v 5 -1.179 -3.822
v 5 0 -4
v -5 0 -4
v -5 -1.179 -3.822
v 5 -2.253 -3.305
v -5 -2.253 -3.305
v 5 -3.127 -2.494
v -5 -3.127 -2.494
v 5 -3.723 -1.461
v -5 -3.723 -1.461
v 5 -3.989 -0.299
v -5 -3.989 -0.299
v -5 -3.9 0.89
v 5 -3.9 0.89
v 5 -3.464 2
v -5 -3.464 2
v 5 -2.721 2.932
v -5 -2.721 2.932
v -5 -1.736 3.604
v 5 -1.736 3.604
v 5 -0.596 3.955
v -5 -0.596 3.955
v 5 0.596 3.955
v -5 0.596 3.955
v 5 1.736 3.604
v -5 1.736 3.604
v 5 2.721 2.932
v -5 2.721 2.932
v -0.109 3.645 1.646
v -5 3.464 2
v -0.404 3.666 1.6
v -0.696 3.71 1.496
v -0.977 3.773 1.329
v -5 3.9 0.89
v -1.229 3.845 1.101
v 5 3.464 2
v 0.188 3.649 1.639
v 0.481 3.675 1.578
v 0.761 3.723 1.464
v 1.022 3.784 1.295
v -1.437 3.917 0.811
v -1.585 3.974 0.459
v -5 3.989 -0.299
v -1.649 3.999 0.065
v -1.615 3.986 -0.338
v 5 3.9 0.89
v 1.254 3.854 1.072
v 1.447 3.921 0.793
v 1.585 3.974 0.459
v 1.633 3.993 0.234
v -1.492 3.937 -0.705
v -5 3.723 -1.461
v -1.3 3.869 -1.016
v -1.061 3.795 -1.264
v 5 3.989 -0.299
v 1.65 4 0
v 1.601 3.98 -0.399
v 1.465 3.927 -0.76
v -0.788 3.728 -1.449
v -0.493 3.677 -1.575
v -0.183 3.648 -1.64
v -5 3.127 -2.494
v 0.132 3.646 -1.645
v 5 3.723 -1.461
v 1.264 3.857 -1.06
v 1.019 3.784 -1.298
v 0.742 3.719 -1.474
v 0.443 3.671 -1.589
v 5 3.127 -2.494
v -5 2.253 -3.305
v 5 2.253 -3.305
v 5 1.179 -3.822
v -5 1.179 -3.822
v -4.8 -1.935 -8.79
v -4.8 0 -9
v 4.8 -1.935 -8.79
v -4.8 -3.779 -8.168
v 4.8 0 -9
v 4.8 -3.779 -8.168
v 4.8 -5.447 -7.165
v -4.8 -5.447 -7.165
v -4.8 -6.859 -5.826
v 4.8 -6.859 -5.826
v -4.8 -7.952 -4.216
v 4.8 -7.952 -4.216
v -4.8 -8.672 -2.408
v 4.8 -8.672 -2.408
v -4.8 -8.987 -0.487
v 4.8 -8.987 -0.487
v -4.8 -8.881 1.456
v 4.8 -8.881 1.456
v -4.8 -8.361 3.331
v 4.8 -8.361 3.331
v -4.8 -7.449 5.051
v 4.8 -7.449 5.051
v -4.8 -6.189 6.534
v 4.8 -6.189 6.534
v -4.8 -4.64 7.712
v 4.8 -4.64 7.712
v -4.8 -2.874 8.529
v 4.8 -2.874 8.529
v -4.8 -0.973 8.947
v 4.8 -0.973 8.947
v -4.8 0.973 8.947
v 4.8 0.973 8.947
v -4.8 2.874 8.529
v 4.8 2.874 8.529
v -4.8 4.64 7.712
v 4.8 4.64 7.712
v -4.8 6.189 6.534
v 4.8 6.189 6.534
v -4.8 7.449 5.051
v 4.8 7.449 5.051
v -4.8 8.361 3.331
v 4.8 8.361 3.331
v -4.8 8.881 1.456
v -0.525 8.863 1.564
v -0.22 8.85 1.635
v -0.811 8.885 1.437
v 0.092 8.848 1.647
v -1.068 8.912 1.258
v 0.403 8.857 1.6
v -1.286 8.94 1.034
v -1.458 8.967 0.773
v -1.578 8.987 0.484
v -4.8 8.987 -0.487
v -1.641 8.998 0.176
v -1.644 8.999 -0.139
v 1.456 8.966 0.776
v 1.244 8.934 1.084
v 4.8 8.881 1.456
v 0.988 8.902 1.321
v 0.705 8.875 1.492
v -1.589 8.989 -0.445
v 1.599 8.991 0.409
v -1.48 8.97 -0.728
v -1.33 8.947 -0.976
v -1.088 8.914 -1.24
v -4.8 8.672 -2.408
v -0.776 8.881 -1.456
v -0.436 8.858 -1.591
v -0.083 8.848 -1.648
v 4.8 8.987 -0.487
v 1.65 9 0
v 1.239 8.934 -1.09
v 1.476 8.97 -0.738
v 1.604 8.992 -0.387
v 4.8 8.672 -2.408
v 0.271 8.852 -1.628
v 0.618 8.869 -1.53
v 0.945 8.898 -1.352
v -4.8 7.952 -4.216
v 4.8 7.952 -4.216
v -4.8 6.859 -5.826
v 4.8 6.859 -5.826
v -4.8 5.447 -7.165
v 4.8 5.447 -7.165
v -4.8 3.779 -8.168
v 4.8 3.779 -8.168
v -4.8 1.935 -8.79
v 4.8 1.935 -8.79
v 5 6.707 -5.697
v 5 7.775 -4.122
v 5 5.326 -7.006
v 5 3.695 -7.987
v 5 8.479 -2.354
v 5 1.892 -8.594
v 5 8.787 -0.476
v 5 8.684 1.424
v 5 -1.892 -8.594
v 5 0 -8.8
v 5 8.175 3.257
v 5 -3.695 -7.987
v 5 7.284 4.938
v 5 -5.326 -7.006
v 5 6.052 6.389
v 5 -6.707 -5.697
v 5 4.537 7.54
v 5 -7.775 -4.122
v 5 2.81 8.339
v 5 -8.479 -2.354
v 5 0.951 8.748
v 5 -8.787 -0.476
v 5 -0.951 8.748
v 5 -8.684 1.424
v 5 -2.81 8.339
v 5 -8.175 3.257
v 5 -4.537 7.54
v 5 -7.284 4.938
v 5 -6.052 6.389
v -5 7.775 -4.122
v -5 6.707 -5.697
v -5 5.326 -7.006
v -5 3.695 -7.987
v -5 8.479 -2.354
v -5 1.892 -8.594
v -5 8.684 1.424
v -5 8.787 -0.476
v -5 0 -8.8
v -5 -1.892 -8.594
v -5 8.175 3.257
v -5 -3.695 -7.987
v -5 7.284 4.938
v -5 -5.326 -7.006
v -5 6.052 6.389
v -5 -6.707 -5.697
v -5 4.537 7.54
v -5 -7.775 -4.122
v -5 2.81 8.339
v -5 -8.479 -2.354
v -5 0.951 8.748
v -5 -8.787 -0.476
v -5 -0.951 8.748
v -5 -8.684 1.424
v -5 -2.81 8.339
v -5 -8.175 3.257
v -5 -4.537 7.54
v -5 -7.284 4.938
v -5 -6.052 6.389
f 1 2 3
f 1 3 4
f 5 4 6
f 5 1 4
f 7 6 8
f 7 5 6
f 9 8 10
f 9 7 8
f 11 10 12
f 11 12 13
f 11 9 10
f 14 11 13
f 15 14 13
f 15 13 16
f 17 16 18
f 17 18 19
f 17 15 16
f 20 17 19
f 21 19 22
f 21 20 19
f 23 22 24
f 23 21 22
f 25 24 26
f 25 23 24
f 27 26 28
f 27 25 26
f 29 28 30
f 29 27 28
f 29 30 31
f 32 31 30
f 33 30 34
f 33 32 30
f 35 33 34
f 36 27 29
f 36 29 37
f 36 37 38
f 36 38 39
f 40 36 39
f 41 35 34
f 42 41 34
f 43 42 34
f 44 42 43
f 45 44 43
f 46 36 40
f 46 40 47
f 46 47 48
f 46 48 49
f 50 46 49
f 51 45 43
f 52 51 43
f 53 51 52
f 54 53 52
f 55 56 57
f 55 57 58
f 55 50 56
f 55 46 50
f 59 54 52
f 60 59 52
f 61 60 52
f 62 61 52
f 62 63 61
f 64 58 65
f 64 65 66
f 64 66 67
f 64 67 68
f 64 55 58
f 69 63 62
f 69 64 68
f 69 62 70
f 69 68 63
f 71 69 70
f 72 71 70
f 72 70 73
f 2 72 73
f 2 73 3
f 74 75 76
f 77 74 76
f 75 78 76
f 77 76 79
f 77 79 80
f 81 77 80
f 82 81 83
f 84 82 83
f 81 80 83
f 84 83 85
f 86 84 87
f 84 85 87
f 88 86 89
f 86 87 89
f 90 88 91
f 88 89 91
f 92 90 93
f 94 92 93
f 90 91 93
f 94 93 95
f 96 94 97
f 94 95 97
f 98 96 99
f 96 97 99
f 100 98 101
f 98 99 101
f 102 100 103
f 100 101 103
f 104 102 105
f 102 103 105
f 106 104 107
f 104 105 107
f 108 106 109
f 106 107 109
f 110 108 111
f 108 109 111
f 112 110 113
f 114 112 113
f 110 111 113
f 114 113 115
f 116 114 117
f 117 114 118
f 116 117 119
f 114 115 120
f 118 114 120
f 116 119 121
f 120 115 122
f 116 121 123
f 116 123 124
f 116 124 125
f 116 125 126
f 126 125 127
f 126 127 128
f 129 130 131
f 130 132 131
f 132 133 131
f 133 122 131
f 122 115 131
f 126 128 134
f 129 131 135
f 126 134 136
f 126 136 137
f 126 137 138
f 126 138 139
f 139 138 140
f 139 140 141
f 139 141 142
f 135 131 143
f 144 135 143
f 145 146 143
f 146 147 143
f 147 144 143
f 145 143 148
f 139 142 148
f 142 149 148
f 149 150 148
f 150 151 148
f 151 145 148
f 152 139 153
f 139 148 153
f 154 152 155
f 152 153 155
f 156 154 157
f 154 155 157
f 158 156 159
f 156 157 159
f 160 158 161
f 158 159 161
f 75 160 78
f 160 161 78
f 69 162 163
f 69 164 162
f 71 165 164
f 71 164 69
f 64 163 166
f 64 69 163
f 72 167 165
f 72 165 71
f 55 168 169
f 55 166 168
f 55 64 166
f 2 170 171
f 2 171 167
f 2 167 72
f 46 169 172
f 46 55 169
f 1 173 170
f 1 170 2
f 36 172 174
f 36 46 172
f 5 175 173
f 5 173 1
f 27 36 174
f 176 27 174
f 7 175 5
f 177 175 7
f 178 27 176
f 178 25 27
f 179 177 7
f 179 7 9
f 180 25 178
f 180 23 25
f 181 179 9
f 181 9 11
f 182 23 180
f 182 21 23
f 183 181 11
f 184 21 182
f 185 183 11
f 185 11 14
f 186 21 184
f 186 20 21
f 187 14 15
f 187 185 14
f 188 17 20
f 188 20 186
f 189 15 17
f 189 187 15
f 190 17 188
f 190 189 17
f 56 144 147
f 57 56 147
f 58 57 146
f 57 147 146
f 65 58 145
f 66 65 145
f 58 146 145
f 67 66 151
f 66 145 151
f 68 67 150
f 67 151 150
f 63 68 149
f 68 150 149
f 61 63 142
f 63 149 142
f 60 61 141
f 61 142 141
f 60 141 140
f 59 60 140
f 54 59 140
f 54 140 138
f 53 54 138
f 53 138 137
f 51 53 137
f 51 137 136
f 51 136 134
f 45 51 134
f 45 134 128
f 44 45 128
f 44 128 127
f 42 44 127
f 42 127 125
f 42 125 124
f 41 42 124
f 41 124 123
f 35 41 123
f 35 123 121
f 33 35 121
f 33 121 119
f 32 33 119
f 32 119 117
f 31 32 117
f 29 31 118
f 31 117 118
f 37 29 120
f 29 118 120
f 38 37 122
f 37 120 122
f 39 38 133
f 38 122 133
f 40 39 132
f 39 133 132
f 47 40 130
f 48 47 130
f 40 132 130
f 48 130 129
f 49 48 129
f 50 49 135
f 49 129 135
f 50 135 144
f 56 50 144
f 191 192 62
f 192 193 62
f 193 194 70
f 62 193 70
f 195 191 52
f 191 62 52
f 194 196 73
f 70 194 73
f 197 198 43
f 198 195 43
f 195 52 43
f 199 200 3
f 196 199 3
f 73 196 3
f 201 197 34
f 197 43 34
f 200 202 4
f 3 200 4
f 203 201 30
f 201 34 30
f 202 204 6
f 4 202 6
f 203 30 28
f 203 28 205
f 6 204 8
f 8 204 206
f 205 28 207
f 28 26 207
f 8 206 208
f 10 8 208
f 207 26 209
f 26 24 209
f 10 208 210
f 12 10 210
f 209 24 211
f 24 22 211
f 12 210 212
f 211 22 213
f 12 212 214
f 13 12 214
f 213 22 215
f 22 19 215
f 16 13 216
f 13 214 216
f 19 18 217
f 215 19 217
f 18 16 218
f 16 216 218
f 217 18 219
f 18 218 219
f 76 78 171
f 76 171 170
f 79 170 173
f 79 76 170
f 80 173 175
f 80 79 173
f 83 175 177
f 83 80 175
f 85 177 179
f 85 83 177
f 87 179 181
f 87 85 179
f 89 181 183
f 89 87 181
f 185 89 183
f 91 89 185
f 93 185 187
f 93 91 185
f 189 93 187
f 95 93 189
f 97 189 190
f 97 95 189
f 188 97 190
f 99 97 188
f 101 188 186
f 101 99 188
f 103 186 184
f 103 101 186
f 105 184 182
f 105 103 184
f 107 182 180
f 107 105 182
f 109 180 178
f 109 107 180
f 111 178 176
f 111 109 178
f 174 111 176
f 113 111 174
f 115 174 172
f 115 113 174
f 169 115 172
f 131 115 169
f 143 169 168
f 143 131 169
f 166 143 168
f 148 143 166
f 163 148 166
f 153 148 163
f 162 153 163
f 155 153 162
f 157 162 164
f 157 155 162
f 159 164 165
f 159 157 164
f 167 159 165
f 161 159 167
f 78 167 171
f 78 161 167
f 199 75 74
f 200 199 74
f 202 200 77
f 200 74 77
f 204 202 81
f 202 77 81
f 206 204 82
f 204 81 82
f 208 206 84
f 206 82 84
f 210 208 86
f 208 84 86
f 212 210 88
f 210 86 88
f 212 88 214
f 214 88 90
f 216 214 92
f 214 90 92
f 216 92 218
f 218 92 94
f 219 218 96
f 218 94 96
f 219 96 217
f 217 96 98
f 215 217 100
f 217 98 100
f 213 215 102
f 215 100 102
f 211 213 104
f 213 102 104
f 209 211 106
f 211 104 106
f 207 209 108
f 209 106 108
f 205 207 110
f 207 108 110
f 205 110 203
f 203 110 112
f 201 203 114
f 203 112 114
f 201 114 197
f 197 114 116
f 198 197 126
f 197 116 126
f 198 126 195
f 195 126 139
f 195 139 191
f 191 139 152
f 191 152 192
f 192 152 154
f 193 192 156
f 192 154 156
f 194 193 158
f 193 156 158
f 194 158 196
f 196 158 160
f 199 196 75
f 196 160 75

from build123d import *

# Parameters (mm, degrees)
SKETCH1_W              = 10
SKETCH1_H              = 5
CHAMFER1_SIZE          = 0.2
M4_TAPPED_HOLE1_REACH  = 22.736
M4_TAPPED_HOLE1_BORE_R = 1.65


with BuildPart() as part:
    # Sketch1 → Revolve1 (revolve)
    with BuildSketch(Plane.XY, mode=Mode.PRIVATE) as revolve1_sk:
        with Locations((0, 6.5)):
            Rectangle(SKETCH1_W, SKETCH1_H)
    revolve(revolve1_sk.sketch.rotate(Axis((0, 0, 0), (-1, 0, 0)), 90), axis=Axis((0, 0, 0), (-1, 0, 0)))

    # Chamfer1
    chamfer1_edges = [part.edges().sort_by_distance(p)[0] for p in [
        (5, 0, 9),
        (-5, 0, 9),
    ]]
    chamfer(chamfer1_edges, length=CHAMFER1_SIZE)

    # M4 Tapped Hole1 bore → M4 Tapped Hole1 (cut, up to next)
    with BuildSketch(Plane(origin=(0, 9, 0), x_dir=(1, 0, 0), z_dir=(0, 1, 0)), mode=Mode.PRIVATE) as m4_tapped_hole1_sk1:
        Circle(M4_TAPPED_HOLE1_BORE_R)
    m4_tapped_hole1_tool1 = extrude(m4_tapped_hole1_sk1.sketch, amount=-M4_TAPPED_HOLE1_REACH, mode=Mode.PRIVATE) & part.part
    add(m4_tapped_hole1_tool1.solids().sort_by_distance((0, 9, 0))[0], mode=Mode.SUBTRACT)


solid = part.part
